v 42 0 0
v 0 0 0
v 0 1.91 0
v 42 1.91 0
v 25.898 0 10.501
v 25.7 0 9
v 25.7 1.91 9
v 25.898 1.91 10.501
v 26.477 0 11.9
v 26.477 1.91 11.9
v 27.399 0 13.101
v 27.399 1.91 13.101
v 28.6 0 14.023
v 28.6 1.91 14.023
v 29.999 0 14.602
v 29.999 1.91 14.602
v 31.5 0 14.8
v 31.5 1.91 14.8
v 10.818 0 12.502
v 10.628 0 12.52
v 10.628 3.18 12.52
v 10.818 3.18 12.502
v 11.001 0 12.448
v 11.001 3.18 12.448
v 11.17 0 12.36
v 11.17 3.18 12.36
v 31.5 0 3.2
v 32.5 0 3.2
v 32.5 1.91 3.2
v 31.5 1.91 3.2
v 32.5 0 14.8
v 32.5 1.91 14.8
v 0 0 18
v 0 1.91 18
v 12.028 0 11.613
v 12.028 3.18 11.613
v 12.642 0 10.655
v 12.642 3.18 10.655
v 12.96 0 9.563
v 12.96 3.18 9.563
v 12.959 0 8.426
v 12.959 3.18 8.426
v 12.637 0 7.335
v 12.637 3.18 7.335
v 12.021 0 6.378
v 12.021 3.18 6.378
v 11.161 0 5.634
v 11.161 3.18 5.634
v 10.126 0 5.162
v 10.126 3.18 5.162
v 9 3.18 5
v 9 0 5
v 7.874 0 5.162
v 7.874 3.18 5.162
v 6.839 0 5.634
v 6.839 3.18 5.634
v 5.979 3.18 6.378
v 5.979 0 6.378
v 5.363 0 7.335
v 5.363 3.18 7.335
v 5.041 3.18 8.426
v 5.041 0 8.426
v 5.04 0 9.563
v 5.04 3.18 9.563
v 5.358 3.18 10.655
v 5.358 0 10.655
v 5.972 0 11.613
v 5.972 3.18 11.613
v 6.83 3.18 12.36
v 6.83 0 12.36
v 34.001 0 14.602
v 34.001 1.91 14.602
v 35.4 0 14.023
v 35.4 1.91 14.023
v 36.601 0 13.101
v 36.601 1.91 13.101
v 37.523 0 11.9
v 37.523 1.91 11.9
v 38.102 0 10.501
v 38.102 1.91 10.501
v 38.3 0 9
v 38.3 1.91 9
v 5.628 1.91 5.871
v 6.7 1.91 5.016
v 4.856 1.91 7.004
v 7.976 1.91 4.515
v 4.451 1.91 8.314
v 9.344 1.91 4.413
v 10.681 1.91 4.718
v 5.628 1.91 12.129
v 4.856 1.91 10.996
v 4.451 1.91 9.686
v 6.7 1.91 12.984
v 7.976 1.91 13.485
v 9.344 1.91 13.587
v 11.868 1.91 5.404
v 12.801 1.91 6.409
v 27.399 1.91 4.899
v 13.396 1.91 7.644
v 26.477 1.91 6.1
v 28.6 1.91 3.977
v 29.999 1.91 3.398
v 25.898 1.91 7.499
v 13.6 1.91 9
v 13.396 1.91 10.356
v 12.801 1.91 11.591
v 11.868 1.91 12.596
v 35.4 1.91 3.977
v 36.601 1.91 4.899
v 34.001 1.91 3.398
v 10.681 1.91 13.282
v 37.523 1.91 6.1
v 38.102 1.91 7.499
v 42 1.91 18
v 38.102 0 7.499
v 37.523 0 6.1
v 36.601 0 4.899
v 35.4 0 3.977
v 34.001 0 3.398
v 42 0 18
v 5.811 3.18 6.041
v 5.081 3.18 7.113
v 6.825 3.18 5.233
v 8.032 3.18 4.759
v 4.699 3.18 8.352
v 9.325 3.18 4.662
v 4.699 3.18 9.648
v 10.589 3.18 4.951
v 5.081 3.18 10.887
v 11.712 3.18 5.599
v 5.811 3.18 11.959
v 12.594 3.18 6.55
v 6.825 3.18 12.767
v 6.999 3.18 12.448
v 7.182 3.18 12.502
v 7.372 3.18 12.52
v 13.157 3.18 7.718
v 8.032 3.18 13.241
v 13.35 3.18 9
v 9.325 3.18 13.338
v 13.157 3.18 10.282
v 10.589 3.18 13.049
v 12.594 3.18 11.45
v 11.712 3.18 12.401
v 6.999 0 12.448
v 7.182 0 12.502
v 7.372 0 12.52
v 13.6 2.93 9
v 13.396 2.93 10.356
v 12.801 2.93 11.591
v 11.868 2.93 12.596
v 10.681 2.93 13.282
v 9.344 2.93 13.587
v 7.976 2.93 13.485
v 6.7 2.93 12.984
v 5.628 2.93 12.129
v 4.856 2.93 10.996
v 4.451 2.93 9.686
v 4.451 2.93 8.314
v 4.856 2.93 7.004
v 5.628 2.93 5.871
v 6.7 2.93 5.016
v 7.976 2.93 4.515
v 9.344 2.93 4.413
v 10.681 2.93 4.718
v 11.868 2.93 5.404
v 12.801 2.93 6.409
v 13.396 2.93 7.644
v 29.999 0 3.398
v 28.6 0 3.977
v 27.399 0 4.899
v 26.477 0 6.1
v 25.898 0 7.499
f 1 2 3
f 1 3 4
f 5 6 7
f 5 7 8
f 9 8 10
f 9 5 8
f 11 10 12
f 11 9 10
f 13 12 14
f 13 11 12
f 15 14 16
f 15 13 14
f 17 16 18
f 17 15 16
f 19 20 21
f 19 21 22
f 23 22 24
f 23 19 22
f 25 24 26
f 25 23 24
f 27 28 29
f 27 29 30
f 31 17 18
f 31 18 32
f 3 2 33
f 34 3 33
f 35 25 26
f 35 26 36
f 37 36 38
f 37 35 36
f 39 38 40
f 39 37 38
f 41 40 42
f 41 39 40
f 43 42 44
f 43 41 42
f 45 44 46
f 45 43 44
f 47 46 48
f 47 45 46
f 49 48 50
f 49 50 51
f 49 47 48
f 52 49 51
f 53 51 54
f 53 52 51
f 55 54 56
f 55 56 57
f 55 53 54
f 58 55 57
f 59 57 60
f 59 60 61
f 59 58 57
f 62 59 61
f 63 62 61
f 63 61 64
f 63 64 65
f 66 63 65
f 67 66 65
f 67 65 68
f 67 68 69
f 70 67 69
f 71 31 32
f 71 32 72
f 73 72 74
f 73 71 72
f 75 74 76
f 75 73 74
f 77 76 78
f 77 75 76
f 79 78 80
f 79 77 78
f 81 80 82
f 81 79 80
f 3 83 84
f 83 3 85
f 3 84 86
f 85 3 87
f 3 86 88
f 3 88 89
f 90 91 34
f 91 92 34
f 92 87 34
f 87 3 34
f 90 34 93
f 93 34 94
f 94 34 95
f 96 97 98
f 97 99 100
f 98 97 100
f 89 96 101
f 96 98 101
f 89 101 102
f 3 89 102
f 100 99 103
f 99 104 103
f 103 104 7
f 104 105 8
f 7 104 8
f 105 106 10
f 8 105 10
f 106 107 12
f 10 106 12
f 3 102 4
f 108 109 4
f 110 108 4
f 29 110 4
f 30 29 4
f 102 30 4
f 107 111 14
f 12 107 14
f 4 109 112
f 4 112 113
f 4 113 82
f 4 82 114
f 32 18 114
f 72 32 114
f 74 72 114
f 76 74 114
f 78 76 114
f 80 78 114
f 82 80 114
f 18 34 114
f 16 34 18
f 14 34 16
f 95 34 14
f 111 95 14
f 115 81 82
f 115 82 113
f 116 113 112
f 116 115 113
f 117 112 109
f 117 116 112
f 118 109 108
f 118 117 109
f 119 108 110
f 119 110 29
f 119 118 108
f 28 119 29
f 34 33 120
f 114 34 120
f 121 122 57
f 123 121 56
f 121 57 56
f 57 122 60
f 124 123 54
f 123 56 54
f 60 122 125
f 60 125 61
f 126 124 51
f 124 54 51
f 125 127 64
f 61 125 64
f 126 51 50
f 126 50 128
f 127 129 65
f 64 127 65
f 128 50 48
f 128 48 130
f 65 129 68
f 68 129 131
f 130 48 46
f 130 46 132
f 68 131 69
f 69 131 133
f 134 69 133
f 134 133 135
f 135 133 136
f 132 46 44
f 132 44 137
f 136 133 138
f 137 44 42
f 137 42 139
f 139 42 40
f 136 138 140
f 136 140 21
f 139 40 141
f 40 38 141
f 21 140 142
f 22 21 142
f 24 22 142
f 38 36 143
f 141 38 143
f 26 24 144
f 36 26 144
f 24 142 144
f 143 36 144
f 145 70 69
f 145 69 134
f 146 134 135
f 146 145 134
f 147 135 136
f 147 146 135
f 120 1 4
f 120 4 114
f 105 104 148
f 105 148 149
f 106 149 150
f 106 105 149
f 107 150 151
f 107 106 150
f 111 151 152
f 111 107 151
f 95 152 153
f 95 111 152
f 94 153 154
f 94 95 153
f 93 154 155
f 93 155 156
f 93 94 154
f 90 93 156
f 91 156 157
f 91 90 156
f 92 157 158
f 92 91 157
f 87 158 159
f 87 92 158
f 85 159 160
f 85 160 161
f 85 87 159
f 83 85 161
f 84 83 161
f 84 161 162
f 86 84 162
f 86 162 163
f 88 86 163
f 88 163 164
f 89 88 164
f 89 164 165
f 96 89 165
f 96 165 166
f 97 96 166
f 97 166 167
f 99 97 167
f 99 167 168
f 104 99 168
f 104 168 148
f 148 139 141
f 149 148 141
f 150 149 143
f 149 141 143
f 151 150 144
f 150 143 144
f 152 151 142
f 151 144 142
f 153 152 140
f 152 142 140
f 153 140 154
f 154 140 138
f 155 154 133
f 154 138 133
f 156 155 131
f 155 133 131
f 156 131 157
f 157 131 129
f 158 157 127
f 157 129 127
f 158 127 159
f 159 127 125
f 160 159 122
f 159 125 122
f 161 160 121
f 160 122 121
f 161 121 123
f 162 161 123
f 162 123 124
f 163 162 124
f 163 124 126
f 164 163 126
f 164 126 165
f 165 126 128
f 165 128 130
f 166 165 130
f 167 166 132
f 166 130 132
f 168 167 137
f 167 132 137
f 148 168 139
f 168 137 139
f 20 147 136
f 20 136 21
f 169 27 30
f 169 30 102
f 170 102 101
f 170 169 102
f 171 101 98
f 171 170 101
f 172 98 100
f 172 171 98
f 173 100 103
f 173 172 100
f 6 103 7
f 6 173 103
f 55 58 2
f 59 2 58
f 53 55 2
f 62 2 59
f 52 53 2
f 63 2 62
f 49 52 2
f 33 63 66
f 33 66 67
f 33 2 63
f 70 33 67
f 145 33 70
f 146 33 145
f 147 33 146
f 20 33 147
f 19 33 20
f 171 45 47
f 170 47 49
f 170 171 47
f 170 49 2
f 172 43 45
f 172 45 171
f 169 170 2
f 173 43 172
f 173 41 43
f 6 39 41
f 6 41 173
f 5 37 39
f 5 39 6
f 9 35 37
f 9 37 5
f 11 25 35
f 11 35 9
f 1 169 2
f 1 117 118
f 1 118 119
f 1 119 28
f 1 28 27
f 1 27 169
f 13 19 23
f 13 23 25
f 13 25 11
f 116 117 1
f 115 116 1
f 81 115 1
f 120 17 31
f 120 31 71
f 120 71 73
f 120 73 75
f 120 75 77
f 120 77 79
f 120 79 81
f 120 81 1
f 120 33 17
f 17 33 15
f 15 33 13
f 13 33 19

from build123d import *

# Parameters (mm, degrees)
F0_W     = 42
F0_H     = 18
F2_DEPTH = 1.91
F1_R     = 4.6
F3_DEPTH = 3.18
F4_SIZE  = 0.25


# Not quite as in the source:
# - a feature names something its author has since deleted; it is built from what else it names


with BuildPart() as f2:
    # F0 (on Front) → F2 (new body)
    with BuildSketch(Plane.XZ):
        with Locations((21, 9)):
            Rectangle(F0_W, F0_H)
        with BuildLine():
            ThreePointArc((11.1703455946, 12.36), (9, 5), (6.8296544054, 12.36))
            ThreePointArc((6.8296544054, 12.36), (7.0893980916, 12.4791663047), (7.372240804, 12.52))
            Line((7.372240804, 12.52), (10.627759196, 12.52))
            ThreePointArc((10.627759196, 12.52), (10.9106019084, 12.4791663047), (11.1703455946, 12.36))
        make_face(mode=Mode.SUBTRACT)
        with BuildLine():
            Line((32.5, 3.2), (31.5, 3.2))
            ThreePointArc((31.5, 3.2), (27.3987806691, 4.8987806691), (25.7, 9))
            ThreePointArc((25.7, 9), (27.3987806691, 13.1012193309), (31.5, 14.8))
            Line((31.5, 14.8), (32.5, 14.8))
            ThreePointArc((32.5, 14.8), (36.6012193309, 13.1012193309), (38.3, 9))
            ThreePointArc((38.3, 9), (36.6012193309, 4.8987806691), (32.5, 3.2))
        make_face(mode=Mode.SUBTRACT)
    extrude(amount=-F2_DEPTH)

    # F1 (on face) → F3 (join)
    with BuildSketch(Plane.XZ):
        with Locations((9, 9)):
            Circle(F1_R)
        with BuildLine():
            ThreePointArc((10.627759196, 12.52), (10.9106019084, 12.4791663047), (11.1703455946, 12.36))
            ThreePointArc((11.1703455946, 12.36), (9, 5), (6.8296544054, 12.36))
            ThreePointArc((6.8296544054, 12.36), (7.0893980916, 12.4791663047), (7.372240804, 12.52))
            Line((7.372240804, 12.52), (10.627759196, 12.52))
        make_face(mode=Mode.SUBTRACT)
    extrude(amount=-F3_DEPTH)

    # F4
    f4_edges = [f2.edges().sort_by_distance(p)[0] for p in [
        (4.4, 3.18, 9),
    ]]
    chamfer(f4_edges, length=F4_SIZE)


solid = f2.part
